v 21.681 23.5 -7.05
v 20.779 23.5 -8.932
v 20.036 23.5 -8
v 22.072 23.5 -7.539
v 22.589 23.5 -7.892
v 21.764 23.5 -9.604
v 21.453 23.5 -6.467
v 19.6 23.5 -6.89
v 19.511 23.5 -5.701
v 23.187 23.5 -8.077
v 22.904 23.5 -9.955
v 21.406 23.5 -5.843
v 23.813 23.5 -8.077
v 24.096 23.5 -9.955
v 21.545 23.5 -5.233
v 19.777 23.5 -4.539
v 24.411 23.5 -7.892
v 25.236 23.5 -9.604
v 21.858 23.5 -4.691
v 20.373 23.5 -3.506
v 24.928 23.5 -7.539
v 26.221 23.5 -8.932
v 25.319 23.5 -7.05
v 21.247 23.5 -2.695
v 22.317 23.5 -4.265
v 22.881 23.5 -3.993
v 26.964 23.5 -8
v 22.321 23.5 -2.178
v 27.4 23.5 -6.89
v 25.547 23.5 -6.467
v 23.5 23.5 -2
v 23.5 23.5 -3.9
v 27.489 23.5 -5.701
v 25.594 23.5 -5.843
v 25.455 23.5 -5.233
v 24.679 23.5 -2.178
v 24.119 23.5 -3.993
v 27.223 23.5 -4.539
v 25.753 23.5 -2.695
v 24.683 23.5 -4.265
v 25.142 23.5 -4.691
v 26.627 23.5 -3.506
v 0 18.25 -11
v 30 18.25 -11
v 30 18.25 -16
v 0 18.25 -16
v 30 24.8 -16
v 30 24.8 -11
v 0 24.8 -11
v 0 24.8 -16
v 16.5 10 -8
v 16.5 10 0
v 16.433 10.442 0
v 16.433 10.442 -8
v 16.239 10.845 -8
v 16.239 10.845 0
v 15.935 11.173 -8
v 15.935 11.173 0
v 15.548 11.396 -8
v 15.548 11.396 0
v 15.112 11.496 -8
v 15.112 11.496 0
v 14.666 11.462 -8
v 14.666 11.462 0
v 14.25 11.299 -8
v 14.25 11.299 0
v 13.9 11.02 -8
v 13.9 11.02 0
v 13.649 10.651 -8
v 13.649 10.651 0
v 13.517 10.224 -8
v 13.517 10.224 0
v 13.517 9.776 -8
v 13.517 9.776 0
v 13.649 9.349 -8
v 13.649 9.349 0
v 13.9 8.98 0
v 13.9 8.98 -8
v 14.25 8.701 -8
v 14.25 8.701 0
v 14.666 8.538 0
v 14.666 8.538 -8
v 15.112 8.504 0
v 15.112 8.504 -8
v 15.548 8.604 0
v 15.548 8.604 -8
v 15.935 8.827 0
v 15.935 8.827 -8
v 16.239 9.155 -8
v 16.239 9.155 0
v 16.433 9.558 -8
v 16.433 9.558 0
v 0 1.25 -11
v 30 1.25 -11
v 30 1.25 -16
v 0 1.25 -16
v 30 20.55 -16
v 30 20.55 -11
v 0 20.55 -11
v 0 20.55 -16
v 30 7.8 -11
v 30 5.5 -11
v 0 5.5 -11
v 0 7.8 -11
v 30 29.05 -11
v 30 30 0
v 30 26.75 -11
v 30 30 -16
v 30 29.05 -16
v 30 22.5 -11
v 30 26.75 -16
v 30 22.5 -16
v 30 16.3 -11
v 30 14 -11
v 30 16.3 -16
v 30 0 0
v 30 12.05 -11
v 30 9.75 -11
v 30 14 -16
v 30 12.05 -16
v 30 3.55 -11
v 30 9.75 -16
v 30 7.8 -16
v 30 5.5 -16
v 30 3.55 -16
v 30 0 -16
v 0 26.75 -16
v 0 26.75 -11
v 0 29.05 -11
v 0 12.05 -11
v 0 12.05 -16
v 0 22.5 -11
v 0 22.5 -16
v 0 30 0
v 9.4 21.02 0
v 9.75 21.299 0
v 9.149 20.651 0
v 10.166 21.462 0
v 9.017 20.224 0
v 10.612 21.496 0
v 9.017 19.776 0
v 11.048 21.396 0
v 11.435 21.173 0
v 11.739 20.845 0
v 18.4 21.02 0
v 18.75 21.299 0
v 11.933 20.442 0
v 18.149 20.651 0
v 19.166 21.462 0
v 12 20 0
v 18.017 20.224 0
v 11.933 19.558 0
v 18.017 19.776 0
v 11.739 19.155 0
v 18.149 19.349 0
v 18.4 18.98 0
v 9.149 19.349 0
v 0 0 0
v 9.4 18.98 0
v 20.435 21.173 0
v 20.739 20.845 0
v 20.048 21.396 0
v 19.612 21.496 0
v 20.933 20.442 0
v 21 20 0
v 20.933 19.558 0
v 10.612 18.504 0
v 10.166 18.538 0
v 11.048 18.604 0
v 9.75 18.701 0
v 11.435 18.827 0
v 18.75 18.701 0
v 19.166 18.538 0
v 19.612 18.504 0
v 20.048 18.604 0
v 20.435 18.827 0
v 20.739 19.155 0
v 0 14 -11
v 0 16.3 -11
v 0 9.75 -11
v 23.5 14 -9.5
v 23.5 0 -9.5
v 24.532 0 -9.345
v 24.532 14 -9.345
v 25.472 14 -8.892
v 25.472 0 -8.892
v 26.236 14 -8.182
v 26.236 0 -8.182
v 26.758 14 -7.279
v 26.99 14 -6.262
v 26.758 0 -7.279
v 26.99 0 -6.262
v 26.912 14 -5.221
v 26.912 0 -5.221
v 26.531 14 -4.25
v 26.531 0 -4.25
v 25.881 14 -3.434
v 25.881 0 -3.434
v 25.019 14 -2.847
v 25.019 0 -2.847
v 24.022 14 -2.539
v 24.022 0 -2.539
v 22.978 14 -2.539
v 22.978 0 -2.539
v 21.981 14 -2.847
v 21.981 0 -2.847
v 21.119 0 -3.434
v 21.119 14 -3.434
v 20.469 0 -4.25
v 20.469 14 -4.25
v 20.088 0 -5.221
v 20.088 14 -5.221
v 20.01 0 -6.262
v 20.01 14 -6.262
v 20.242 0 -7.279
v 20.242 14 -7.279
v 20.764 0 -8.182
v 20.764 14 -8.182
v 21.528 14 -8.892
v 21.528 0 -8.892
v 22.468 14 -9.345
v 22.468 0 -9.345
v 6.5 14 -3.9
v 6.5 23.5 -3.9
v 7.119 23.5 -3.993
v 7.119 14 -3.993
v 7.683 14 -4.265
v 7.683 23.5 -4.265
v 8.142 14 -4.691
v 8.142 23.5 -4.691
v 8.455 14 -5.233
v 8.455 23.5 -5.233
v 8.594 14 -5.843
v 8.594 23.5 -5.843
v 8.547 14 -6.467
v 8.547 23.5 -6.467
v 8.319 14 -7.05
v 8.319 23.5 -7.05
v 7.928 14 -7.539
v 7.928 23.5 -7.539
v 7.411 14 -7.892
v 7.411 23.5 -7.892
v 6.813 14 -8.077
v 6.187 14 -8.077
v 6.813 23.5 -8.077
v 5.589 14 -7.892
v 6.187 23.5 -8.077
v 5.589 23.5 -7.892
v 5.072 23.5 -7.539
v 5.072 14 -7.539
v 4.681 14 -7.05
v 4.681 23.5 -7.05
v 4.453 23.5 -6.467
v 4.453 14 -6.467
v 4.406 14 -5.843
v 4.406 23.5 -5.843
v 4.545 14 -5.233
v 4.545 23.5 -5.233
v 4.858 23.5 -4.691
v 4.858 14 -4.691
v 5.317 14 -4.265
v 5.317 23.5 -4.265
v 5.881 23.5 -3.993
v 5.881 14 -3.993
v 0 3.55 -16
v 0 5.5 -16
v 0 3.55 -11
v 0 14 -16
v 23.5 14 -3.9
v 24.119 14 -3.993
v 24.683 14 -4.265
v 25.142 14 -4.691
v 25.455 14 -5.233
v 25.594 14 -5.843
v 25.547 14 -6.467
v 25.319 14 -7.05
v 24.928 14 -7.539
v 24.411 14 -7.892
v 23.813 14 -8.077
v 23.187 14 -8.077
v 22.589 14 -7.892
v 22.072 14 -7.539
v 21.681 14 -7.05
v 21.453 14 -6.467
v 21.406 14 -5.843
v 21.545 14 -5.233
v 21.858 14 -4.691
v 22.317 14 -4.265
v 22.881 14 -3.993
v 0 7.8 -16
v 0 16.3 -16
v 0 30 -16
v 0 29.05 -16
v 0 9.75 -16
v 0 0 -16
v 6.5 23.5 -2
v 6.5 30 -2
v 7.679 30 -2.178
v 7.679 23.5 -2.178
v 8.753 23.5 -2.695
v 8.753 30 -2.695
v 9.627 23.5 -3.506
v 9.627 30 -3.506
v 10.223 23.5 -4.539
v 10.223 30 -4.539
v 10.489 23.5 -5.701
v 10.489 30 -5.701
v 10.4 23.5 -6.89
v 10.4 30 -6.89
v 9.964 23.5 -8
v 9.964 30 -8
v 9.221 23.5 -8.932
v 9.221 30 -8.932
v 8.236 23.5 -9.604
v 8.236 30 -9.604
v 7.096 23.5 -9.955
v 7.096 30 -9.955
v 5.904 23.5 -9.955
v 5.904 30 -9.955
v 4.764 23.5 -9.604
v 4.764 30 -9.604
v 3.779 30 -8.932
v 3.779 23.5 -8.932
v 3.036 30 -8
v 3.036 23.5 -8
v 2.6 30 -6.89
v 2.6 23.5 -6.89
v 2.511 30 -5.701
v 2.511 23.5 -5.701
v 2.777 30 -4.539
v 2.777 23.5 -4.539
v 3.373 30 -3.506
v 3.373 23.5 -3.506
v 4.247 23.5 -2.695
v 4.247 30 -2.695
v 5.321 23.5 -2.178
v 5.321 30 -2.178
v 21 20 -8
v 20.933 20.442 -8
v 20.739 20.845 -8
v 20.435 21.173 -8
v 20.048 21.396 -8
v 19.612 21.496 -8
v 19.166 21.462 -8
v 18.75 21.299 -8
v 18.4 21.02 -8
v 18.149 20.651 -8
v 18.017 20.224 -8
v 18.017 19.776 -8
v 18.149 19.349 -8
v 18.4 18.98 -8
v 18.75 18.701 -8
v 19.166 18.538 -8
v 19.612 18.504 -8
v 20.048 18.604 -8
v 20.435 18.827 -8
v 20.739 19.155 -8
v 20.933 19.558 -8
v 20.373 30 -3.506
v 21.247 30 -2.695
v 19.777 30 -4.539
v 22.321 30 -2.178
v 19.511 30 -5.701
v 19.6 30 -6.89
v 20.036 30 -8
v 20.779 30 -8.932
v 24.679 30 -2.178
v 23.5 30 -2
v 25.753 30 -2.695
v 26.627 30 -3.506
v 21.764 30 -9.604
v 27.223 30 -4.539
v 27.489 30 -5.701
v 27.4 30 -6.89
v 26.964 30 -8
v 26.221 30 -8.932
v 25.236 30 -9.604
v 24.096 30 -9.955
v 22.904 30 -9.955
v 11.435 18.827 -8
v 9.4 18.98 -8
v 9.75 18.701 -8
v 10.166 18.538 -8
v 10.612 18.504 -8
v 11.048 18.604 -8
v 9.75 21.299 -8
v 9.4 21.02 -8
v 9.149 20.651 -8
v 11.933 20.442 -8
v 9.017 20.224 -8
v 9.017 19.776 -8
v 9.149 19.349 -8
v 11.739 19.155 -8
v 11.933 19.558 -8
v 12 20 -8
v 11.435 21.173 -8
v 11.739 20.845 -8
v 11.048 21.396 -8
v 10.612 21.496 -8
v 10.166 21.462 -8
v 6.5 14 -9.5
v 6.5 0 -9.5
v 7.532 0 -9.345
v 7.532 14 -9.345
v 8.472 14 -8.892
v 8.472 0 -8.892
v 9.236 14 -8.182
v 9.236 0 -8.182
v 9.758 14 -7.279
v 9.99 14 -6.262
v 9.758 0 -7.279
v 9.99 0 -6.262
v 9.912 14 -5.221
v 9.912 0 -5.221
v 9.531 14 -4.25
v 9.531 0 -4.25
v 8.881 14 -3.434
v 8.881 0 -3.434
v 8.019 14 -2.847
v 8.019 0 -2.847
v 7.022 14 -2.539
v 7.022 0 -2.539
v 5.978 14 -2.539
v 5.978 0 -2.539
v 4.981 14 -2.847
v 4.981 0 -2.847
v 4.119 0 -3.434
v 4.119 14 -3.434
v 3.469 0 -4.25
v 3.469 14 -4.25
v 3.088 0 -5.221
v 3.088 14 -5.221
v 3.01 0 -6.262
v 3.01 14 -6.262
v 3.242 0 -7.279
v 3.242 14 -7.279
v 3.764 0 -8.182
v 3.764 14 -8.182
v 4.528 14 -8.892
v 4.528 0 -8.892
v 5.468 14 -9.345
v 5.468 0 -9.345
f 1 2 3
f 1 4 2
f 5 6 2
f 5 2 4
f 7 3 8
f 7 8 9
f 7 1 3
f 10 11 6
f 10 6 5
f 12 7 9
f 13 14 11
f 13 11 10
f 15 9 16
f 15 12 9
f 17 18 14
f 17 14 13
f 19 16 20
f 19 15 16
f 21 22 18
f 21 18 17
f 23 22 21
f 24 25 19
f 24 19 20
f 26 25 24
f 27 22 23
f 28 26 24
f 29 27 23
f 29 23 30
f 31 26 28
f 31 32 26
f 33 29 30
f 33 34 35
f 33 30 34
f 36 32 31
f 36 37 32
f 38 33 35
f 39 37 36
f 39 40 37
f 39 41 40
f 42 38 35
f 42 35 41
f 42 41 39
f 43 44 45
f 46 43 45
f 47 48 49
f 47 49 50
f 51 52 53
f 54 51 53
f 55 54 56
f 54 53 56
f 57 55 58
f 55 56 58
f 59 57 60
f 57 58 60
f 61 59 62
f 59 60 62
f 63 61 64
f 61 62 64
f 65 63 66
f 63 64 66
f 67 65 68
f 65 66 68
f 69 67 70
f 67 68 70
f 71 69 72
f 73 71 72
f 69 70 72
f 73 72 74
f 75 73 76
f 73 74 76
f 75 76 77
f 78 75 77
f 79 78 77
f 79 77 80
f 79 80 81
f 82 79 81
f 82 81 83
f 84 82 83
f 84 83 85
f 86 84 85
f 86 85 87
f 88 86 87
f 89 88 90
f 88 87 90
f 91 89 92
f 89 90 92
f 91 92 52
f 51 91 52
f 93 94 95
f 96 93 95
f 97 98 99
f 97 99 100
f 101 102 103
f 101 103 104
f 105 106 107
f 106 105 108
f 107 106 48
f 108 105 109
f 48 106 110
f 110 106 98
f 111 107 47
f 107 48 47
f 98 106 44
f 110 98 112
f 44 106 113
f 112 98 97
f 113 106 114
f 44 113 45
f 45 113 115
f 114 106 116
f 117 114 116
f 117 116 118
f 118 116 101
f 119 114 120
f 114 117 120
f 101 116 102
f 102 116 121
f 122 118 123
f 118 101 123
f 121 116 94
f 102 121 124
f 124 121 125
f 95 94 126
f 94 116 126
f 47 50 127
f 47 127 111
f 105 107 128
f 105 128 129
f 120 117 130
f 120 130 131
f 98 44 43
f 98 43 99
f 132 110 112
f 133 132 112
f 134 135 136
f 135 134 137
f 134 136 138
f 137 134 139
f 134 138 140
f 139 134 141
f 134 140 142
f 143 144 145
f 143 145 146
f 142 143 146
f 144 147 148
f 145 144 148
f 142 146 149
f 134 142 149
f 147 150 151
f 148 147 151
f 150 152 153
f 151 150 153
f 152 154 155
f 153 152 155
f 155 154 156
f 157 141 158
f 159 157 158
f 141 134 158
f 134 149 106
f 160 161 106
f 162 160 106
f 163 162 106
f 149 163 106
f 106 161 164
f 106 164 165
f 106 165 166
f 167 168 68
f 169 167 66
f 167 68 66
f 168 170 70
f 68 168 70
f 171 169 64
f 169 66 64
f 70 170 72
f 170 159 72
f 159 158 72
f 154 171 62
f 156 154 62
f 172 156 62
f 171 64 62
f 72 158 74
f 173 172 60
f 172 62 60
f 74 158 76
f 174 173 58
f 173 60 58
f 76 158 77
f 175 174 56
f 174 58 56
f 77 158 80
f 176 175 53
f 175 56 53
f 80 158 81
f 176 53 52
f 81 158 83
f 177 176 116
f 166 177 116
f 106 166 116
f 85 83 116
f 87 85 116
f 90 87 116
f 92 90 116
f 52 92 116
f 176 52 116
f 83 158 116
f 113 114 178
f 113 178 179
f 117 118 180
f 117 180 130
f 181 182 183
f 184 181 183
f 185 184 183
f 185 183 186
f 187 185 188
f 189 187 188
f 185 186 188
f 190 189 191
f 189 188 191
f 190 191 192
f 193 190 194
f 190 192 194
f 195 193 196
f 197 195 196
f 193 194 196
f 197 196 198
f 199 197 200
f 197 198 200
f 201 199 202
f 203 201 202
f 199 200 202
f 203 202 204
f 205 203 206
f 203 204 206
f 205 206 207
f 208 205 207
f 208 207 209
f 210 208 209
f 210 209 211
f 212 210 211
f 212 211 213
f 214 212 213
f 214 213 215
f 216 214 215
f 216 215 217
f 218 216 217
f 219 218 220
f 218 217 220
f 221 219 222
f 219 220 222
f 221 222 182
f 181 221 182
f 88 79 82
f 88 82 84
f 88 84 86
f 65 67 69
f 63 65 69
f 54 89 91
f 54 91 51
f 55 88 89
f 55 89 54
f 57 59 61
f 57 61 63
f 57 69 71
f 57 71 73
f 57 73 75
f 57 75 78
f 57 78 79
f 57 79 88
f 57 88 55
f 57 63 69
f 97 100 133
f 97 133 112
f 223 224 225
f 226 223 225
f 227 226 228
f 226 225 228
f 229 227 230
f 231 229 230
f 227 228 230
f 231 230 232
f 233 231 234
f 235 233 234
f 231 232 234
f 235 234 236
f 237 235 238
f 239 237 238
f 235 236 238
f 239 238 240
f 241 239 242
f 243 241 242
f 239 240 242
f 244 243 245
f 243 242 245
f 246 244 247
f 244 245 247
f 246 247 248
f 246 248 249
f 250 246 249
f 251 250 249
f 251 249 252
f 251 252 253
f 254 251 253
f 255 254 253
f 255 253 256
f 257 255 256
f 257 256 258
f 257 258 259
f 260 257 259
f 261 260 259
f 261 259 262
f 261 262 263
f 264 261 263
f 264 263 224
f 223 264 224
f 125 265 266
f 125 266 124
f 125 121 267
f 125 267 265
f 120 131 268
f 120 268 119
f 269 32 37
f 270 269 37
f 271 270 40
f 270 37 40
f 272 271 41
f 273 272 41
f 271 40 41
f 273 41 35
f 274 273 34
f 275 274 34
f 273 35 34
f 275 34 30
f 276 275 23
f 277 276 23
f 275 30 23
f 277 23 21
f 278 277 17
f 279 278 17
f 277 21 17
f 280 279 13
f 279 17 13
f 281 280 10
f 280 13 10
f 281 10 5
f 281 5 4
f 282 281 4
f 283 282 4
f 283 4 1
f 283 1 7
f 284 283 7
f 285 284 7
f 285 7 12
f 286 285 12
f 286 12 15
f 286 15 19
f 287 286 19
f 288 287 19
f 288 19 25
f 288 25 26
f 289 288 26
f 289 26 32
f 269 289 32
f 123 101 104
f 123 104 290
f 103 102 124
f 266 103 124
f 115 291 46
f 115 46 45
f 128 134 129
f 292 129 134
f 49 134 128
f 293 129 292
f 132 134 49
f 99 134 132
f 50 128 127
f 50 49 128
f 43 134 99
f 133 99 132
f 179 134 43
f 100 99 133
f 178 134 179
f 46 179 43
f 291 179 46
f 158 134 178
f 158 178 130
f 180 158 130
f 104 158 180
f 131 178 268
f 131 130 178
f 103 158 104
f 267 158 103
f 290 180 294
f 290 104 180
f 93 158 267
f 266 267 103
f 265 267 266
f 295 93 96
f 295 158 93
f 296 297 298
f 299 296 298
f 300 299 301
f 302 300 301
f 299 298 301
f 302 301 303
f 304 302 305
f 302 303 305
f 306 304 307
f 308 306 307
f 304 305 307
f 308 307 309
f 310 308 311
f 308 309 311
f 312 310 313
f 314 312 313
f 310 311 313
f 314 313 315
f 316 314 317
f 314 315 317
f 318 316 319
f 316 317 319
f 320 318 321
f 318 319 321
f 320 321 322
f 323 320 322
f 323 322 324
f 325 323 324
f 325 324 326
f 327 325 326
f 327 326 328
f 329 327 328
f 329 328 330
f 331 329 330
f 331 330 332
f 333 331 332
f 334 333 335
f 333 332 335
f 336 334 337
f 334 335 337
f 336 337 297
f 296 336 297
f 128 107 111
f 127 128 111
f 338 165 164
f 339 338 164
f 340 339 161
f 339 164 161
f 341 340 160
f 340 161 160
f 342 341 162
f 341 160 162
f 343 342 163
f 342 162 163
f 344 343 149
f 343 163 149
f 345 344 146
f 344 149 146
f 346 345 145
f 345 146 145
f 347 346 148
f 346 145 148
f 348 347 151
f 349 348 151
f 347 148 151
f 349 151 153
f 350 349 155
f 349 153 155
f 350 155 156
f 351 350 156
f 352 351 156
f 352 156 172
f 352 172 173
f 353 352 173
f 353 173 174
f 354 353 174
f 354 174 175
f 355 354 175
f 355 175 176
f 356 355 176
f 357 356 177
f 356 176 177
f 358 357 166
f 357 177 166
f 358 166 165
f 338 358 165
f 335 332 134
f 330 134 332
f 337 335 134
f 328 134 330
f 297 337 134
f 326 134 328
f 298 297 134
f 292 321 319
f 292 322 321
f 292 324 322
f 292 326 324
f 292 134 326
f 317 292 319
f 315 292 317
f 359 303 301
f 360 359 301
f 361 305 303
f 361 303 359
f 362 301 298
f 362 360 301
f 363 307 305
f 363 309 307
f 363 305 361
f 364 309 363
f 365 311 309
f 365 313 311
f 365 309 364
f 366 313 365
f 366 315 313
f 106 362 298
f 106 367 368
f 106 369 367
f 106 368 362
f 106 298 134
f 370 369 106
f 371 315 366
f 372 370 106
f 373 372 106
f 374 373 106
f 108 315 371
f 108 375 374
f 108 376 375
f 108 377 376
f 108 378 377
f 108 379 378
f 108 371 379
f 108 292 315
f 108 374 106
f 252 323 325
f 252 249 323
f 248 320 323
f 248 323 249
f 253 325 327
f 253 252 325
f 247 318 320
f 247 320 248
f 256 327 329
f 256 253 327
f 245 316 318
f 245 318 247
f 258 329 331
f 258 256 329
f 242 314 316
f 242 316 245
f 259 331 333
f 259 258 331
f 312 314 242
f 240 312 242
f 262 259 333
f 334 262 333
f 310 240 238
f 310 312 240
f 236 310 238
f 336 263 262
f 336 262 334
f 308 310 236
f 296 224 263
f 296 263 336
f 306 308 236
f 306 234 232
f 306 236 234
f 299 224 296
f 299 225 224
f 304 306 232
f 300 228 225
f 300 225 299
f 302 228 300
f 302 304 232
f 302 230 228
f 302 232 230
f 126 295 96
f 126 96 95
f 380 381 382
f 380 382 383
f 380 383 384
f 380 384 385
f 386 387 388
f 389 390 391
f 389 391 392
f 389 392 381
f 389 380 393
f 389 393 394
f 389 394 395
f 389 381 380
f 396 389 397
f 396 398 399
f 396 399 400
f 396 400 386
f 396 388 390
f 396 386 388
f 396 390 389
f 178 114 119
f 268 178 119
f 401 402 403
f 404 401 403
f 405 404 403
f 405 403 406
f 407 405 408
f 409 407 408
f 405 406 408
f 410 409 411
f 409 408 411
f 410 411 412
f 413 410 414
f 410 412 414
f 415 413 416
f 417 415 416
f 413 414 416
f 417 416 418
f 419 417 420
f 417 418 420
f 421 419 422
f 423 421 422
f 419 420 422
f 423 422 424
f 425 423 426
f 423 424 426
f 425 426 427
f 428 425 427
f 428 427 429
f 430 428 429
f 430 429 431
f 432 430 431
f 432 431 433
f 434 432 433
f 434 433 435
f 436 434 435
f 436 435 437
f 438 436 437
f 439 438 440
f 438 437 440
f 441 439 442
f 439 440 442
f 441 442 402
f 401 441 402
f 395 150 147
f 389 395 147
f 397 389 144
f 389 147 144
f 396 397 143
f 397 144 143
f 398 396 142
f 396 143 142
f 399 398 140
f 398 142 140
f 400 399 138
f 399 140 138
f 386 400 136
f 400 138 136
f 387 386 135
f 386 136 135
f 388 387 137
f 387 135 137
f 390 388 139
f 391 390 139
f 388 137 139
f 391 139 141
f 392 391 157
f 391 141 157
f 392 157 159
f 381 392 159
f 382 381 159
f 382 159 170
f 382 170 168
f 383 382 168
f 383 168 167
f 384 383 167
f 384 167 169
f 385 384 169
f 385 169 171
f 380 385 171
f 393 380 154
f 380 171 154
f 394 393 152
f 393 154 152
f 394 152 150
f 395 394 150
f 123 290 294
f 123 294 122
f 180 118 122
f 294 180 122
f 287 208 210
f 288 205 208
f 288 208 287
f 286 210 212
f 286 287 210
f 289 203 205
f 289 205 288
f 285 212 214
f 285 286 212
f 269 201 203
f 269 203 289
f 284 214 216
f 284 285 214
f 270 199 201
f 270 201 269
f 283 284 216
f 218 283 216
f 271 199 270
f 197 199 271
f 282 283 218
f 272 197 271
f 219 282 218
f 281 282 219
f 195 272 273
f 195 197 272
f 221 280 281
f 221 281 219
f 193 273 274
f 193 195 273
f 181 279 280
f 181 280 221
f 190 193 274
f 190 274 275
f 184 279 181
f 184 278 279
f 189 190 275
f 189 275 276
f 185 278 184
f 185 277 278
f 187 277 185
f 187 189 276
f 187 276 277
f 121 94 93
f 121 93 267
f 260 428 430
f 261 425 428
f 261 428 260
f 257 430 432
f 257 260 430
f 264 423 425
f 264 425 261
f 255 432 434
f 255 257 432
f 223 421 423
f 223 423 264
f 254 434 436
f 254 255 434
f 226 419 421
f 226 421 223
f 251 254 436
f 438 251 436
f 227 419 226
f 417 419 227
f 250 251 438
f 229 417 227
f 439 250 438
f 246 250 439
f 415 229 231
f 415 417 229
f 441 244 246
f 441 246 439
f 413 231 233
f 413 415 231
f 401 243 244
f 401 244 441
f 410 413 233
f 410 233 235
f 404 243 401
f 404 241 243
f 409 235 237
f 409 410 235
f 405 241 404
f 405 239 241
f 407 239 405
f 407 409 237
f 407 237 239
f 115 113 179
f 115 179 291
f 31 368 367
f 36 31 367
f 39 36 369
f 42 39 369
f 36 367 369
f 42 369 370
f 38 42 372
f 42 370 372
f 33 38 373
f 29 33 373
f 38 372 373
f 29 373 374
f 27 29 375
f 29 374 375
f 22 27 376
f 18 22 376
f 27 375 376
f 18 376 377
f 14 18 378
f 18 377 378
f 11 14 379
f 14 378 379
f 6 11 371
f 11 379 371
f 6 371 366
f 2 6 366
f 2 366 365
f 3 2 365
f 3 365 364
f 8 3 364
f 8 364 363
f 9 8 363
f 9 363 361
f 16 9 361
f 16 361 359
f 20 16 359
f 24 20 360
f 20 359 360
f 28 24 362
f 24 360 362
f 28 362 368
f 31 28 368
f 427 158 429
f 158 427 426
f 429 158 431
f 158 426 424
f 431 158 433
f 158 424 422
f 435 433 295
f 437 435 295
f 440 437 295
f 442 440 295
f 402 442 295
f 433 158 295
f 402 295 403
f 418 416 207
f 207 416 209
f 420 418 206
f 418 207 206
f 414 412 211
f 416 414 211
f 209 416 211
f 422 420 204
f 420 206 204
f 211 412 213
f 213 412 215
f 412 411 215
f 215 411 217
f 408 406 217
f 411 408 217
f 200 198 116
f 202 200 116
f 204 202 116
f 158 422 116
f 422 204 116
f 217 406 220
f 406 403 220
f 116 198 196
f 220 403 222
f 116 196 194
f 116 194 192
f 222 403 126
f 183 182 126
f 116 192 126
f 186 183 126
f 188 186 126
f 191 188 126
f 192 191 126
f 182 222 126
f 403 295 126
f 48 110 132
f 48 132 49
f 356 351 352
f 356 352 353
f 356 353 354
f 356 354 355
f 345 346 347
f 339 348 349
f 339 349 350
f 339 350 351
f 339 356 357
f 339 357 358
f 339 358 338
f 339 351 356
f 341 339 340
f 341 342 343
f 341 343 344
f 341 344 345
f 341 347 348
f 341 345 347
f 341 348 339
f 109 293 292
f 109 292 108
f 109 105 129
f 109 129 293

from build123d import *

# Parameters (mm, degrees)
SKETCH1_W           = 30
SKETCH1_H           = 16
BOSS_EXTRUDE1_DEPTH = 30
CUT_EXTRUDE1_REACH  = 47.343
SKETCH2_R           = 2.1
SKETCH3_R           = 4
CUT_EXTRUDE2_DEPTH  = 6.5
SKETCH4_R           = 3.5
CUT_EXTRUDE3_DEPTH  = 14
SKETCH6_W           = 6.374381548
SKETCH6_H           = 2.3
CUT_EXTRUDE8_DEPTH  = 46.343136195
SKETCH7_R           = 1.5
CUT_EXTRUDE9_DEPTH  = 8


with BuildPart() as part:
    # Sketch1 → Boss-Extrude1 (new body)
    with BuildSketch(Plane(origin=(0, 0, 0), x_dir=(1, 0, 0), z_dir=(0, 1, 0))):
        with Locations((15, 8)):
            Rectangle(SKETCH1_W, SKETCH1_H)
    extrude(amount=BOSS_EXTRUDE1_DEPTH)

    # Sketch2 → Cut-Extrude1 (cut, up to next)
    with BuildSketch(Plane(origin=(0, 30, 0), x_dir=(1, 0, 0), z_dir=(0, 1, 0)), mode=Mode.PRIVATE) as cut_extrude1_sk1:
        with Locations(Location((6.5, 6, 0), (0, 0, 270))):
            Circle(SKETCH2_R)
    cut_extrude1_tool1 = extrude(cut_extrude1_sk1.sketch, amount=-CUT_EXTRUDE1_REACH, mode=Mode.PRIVATE) & part.part
    # Sketch2 → Cut-Extrude1 (cut, up to next)
    with BuildSketch(Plane(origin=(0, 30, 0), x_dir=(1, 0, 0), z_dir=(0, 1, 0)), mode=Mode.PRIVATE) as cut_extrude1_sk2:
        with Locations(Location((23.5, 6, 0), (0, 0, 270))):
            Circle(SKETCH2_R)
    cut_extrude1_tool2 = extrude(cut_extrude1_sk2.sketch, amount=-CUT_EXTRUDE1_REACH, mode=Mode.PRIVATE) & part.part
    add(cut_extrude1_tool1.solids().sort_by_distance((6.5, 30, -6))[0], mode=Mode.SUBTRACT)
    add(cut_extrude1_tool2.solids().sort_by_distance((23.5, 30, -6))[0], mode=Mode.SUBTRACT)

    # Sketch3 → Cut-Extrude2 (cut)
    with BuildSketch(Plane(origin=(0, 30, 0), x_dir=(1, 0, 0), z_dir=(0, 1, 0))):
        with Locations(Location((6.5, 6, 0), (0, 0, 270))):
            Circle(SKETCH3_R)
        with Locations(Location((23.5, 6, 0), (0, 0, 270))):
            Circle(SKETCH3_R)
    extrude(amount=-CUT_EXTRUDE2_DEPTH, mode=Mode.SUBTRACT)

    # Sketch4 → Cut-Extrude3 (cut)
    with BuildSketch(Plane.XZ):
        with Locations(Location((6.5, -6, 0), (0, 0, 270))):
            Circle(SKETCH4_R)
        with Locations(Location((23.5, -6, 0), (0, 0, 270))):
            Circle(SKETCH4_R)
    extrude(amount=-CUT_EXTRUDE3_DEPTH, mode=Mode.SUBTRACT)

    # Sketch6 → Cut-Extrude8 (cut, through all)
    with BuildSketch(Plane(origin=(30, 0, 0), x_dir=(0, 0, -1), z_dir=(1, 0, 0))):
        with Locations((14.187190774, 2.4)):
            Rectangle(SKETCH6_W, SKETCH6_H)
        with Locations((14.187190774, 6.65)):
            Rectangle(SKETCH6_W, SKETCH6_H)
        with Locations((14.187190774, 10.9)):
            Rectangle(SKETCH6_W, SKETCH6_H)
        with Locations((14.187190774, 15.15)):
            Rectangle(SKETCH6_W, SKETCH6_H)
        with Locations((14.187190774, 19.4)):
            Rectangle(SKETCH6_W, SKETCH6_H)
        with Locations((14.187190774, 23.65)):
            Rectangle(SKETCH6_W, SKETCH6_H)
        with Locations((14.187190774, 27.9)):
            Rectangle(SKETCH6_W, SKETCH6_H)
    extrude(amount=-CUT_EXTRUDE8_DEPTH, mode=Mode.SUBTRACT)

    # Sketch7 → Cut-Extrude9 (cut)
    with BuildSketch(Plane.XY):
        with Locations((15, 10)):
            Circle(SKETCH7_R)
        with Locations((10.5, 20)):
            Circle(SKETCH7_R)
        with Locations((19.5, 20)):
            Circle(SKETCH7_R)
    extrude(amount=-CUT_EXTRUDE9_DEPTH, mode=Mode.SUBTRACT)


solid = part.part
